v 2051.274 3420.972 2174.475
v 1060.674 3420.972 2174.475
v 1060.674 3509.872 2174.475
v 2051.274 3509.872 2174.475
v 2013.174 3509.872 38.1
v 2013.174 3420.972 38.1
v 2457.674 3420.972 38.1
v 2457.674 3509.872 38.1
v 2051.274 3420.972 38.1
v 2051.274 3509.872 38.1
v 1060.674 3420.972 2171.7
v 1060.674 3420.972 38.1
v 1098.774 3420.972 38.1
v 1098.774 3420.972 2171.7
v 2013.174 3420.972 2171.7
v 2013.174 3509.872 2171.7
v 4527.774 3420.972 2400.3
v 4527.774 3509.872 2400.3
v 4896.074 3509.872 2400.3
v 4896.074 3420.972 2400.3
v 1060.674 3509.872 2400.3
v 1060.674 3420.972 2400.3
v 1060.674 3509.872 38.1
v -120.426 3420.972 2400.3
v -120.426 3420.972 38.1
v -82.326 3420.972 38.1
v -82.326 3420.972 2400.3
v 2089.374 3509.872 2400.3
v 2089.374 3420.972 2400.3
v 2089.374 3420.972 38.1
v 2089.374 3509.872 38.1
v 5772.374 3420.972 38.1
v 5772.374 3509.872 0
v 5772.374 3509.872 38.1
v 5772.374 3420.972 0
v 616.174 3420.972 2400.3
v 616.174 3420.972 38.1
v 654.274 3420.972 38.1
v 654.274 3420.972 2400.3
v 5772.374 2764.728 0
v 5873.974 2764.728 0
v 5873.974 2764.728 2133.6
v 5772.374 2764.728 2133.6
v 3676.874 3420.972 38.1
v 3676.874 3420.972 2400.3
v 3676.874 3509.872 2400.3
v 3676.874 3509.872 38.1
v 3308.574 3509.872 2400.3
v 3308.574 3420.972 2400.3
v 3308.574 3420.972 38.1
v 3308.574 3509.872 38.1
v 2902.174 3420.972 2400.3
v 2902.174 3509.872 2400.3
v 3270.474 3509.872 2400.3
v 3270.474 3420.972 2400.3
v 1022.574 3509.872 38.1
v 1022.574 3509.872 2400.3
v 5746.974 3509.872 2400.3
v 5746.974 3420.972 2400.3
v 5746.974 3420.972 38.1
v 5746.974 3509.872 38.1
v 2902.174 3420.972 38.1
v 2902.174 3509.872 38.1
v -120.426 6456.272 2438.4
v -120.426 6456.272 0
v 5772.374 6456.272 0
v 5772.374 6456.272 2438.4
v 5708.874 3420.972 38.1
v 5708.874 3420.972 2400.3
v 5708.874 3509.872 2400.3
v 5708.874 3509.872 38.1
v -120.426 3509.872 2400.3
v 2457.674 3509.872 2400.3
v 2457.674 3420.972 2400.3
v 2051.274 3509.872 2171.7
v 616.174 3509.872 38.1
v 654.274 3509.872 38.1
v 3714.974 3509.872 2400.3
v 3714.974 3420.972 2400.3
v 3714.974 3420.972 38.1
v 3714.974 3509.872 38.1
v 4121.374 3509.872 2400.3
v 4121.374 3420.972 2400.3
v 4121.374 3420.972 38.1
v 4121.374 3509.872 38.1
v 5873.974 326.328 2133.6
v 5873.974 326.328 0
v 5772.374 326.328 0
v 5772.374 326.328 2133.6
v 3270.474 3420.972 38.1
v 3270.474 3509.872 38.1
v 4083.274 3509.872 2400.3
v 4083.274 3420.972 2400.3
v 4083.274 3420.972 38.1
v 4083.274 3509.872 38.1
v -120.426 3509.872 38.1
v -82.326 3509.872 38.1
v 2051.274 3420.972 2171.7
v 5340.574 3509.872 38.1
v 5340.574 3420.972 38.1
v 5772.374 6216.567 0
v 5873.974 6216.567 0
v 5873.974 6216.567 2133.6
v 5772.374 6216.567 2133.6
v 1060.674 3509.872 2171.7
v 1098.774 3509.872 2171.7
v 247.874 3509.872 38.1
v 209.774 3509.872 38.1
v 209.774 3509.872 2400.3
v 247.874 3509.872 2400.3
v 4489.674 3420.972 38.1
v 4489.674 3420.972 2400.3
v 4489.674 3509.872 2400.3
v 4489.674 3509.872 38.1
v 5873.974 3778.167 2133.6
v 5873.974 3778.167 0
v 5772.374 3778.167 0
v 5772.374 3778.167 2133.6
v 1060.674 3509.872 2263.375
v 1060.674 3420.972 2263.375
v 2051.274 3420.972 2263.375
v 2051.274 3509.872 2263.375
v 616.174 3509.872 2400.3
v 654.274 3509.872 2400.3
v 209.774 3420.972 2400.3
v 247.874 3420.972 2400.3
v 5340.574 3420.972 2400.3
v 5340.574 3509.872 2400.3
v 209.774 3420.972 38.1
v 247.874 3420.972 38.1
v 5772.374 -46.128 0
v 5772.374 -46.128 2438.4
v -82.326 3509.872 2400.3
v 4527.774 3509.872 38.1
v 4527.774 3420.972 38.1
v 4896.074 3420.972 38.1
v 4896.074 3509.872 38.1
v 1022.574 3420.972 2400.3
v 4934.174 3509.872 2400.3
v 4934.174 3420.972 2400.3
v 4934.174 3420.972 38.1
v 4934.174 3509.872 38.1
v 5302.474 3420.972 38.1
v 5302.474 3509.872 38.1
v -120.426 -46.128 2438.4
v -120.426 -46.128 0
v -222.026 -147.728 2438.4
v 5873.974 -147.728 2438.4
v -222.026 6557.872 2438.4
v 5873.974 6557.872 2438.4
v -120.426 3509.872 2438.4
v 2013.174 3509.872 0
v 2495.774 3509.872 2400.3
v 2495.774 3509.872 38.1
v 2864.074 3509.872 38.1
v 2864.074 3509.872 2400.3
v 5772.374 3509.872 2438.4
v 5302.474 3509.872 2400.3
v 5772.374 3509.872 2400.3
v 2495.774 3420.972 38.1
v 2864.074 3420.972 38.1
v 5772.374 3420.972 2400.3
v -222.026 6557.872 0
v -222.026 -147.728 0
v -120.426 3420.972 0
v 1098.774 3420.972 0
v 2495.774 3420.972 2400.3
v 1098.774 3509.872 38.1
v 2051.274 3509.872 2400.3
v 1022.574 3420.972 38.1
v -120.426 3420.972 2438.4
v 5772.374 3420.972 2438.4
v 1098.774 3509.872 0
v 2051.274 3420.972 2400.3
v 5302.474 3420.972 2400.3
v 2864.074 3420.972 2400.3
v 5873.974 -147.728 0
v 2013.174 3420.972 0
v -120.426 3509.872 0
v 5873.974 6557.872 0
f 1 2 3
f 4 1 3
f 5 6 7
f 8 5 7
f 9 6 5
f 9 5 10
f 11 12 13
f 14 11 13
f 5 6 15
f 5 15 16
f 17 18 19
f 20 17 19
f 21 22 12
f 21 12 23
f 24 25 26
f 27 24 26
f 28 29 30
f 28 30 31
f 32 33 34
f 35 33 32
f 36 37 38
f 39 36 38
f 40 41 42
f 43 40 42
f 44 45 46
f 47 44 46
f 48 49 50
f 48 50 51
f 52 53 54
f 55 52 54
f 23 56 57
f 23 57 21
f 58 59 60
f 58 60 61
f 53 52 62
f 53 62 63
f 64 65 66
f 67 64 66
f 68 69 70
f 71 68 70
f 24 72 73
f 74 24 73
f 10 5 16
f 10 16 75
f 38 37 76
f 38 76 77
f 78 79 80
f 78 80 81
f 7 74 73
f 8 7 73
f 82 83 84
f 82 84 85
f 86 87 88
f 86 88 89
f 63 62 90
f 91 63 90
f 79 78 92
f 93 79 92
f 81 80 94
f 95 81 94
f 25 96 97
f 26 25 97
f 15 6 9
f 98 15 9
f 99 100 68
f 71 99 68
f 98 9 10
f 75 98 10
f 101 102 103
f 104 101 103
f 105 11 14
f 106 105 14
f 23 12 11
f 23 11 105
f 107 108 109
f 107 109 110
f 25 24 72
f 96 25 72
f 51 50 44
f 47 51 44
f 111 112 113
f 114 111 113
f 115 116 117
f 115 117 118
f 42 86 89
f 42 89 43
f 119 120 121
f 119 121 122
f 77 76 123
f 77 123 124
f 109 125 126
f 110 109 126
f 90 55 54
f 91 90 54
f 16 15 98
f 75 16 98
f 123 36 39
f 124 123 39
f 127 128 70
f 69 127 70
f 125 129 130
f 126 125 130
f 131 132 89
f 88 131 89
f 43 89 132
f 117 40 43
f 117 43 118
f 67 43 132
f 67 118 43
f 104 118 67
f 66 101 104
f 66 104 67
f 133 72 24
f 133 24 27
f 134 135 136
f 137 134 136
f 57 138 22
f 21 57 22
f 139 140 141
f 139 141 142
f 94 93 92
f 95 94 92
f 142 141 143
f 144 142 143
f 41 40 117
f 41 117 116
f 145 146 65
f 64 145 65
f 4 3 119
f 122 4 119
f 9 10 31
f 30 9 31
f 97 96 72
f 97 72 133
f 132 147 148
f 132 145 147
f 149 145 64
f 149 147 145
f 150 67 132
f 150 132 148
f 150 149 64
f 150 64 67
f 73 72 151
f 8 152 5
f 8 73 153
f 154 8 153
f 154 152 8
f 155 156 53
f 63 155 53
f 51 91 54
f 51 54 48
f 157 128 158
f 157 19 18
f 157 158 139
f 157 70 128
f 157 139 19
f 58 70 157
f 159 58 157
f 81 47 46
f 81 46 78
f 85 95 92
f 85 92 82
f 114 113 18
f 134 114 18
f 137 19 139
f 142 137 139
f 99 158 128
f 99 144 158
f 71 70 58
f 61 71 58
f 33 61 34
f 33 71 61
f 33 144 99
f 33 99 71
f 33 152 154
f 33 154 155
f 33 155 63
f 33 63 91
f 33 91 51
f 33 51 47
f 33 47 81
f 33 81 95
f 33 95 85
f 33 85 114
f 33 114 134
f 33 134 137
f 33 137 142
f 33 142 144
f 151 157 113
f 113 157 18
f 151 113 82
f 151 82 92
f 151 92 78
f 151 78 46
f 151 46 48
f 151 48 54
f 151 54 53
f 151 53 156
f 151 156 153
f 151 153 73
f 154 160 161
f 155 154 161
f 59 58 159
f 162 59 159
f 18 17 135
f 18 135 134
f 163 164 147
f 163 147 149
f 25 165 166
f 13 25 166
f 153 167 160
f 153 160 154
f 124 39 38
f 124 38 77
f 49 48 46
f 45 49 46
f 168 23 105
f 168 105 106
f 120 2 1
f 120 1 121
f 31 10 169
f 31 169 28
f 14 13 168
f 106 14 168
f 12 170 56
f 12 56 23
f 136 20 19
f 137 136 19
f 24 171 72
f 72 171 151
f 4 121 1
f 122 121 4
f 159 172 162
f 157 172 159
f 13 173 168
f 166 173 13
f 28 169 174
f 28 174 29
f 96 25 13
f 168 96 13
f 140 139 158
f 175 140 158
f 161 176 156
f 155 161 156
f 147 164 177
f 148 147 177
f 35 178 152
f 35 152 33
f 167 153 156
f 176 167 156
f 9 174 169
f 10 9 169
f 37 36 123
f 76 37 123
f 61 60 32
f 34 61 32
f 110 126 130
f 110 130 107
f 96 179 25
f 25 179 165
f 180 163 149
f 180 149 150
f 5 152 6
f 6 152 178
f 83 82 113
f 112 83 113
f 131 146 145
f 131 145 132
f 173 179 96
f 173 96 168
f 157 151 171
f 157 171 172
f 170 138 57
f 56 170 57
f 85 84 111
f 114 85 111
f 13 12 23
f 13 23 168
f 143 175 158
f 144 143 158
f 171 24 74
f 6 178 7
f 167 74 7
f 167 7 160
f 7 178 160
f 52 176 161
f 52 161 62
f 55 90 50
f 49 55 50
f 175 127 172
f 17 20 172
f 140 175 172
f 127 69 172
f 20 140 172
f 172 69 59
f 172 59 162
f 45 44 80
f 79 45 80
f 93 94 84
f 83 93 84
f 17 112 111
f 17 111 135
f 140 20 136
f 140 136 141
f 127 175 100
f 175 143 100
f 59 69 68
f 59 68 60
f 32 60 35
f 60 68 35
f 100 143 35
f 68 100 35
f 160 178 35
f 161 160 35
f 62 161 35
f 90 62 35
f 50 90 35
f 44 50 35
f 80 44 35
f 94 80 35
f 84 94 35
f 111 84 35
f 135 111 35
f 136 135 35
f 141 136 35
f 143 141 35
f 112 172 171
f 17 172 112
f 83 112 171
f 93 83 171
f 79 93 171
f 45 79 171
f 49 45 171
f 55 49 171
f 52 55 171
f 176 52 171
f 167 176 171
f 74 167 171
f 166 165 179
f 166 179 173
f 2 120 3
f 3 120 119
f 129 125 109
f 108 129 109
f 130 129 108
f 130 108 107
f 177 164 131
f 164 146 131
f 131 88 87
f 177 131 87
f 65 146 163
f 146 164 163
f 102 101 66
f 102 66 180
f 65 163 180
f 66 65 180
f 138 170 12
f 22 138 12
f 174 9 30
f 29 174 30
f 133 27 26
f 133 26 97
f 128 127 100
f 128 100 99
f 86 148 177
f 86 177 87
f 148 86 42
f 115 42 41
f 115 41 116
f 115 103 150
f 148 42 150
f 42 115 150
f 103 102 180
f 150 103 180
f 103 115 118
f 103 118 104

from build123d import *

# Parameters (mm, degrees)
F0_W      = 6096
F0_H      = 6705.6
F0_W_2    = 5892.8
F0_H_2    = 6502.4
F1_DEPTH  = 2438.4
F2_W      = 2438.4
F2_H      = 2133.6
F3_DEPTH  = 101.6
F4_W      = 5892.8
F4_H      = 88.9
F5_DEPTH  = 38.1
F6_W      = 5892.8
F6_H      = 88.9
F7_DEPTH  = 38.1
F8_W      = 914.4
F8_H      = 88.9
F9_DEPTH  = 38.1
F10_W     = 38.1
F10_H     = 88.9
F11_DEPTH = 2133.6
F12_W     = 38.1
F12_H     = 88.9
F13_DEPTH = 2362.2
F14_W     = 88.9
F14_H     = 88.9
F15_DEPTH = 990.6
F16_W     = 38.1
F16_H     = 88.9
F17_DEPTH = 2362.2
F18_W     = 38.1
F18_H     = 88.9
F19_DEPTH = 2362.2


with BuildPart() as f1:
    # F0 (on Top) → F1 (new body)
    with BuildSketch(Plane.XY):
        with Locations((2825.973807, 3205.072267)):
            Rectangle(F0_W, F0_H)
        with Locations((2825.973807, 3205.072267)):
            Rectangle(F0_W_2, F0_H_2, mode=Mode.SUBTRACT)
    extrude(amount=F1_DEPTH)

    # F2 (on face) → F3 (cut, through all)
    with BuildSketch(Plane.YZ.offset(5873.973807)):
        with Locations((4997.367248, 1066.8)):
            Rectangle(F2_W, F2_H)
        with Locations((1545.52792, 1066.8)):
            Rectangle(F2_W, F2_H)
    extrude(amount=-F3_DEPTH, mode=Mode.SUBTRACT)


with BuildPart() as f5:
    # F4 (on face) → F5 (new body)
    with BuildSketch(Plane.XY.offset(2438.4)):
        with Locations((2825.973807, 3465.422267)):
            Rectangle(F4_W, F4_H)
    extrude(amount=-F5_DEPTH)



with BuildPart() as f7:
    # F6 (on face) → F7 (new body)
    with BuildSketch(Plane(origin=(0, 0, 0), x_dir=(1, 0, 0), z_dir=(0, 0, -1))):
        with Locations((2825.973807, -3465.422267)):
            Rectangle(F6_W, F6_H)
    extrude(amount=-F7_DEPTH)

    # F8 (on face) → F9 (cut, through all)
    with BuildSketch(Plane(origin=(0, 0, 0), x_dir=(1, 0, 0), z_dir=(0, 0, -1))):
        with Locations((1555.973807, -3465.422267)):
            Rectangle(F8_W, F8_H)
    extrude(amount=-F9_DEPTH, mode=Mode.SUBTRACT)


with BuildPart() as f11:
    # F10 (on face) → F11 (new body)
    with BuildSketch(Plane.XY.offset(38.1)):
        with Locations((2032.223807, 3465.422267)):
            Rectangle(F10_W, F10_H)
        with Locations((1079.723807, 3465.422267)):
            Rectangle(F10_W, F10_H)
    extrude(amount=F11_DEPTH)


with BuildPart() as f13:
    # F12 (on face) → F13 (new body)
    with BuildSketch(Plane.XY.offset(38.1)):
        with Locations((2070.323807, 3465.422267)):
            Rectangle(F12_W, F12_H)
        with Locations((1041.623807, 3465.422267)):
            Rectangle(F12_W, F12_H)
    extrude(amount=F13_DEPTH)


with BuildPart() as f15:
    # F14 (on face) → F15 (new body, through all)
    with BuildSketch(Plane.YZ.offset(1060.673807)):
        with Locations((3465.422267, 2218.924955)):
            Rectangle(F14_W, F14_H)
    extrude(amount=F15_DEPTH)


with BuildPart() as f5_1:
    add(f5.part)

    add(f7.part)  # F17 merges F7
    # F16 (on face) → F17 (join, through all)
    with BuildSketch(Plane.XY.offset(38.1)):
        with Locations((2476.723807, 3465.422267)):
            Rectangle(F16_W, F16_H)
        with Locations((2883.123807, 3465.422267)):
            Rectangle(F16_W, F16_H)
        with Locations((3289.523807, 3465.422267)):
            Rectangle(F16_W, F16_H)
        with Locations((3695.923807, 3465.422267)):
            Rectangle(F16_W, F16_H)
        with Locations((4102.323807, 3465.422267)):
            Rectangle(F16_W, F16_H)
        with Locations((4508.723807, 3465.422267)):
            Rectangle(F16_W, F16_H)
        with Locations((4915.123807, 3465.422267)):
            Rectangle(F16_W, F16_H)
        with Locations((5321.523807, 3465.422267)):
            Rectangle(F16_W, F16_H)
        with Locations((5727.923807, 3465.422267)):
            Rectangle(F16_W, F16_H)
    extrude(amount=F17_DEPTH)


with BuildPart() as f19:
    # F18 (on face) → F19 (new body, through all)
    with BuildSketch(Plane.XY.offset(38.1)):
        with Locations((635.223807, 3465.422267)):
            Rectangle(F18_W, F18_H)
        with Locations((228.823807, 3465.422267)):
            Rectangle(F18_W, F18_H)
        with Locations((-101.376193, 3465.422267)):
            Rectangle(F18_W, F18_H)
    extrude(amount=F19_DEPTH)


solid = Compound([f1.part, f11.part, f13.part, f15.part, f5_1.part, f19.part])
